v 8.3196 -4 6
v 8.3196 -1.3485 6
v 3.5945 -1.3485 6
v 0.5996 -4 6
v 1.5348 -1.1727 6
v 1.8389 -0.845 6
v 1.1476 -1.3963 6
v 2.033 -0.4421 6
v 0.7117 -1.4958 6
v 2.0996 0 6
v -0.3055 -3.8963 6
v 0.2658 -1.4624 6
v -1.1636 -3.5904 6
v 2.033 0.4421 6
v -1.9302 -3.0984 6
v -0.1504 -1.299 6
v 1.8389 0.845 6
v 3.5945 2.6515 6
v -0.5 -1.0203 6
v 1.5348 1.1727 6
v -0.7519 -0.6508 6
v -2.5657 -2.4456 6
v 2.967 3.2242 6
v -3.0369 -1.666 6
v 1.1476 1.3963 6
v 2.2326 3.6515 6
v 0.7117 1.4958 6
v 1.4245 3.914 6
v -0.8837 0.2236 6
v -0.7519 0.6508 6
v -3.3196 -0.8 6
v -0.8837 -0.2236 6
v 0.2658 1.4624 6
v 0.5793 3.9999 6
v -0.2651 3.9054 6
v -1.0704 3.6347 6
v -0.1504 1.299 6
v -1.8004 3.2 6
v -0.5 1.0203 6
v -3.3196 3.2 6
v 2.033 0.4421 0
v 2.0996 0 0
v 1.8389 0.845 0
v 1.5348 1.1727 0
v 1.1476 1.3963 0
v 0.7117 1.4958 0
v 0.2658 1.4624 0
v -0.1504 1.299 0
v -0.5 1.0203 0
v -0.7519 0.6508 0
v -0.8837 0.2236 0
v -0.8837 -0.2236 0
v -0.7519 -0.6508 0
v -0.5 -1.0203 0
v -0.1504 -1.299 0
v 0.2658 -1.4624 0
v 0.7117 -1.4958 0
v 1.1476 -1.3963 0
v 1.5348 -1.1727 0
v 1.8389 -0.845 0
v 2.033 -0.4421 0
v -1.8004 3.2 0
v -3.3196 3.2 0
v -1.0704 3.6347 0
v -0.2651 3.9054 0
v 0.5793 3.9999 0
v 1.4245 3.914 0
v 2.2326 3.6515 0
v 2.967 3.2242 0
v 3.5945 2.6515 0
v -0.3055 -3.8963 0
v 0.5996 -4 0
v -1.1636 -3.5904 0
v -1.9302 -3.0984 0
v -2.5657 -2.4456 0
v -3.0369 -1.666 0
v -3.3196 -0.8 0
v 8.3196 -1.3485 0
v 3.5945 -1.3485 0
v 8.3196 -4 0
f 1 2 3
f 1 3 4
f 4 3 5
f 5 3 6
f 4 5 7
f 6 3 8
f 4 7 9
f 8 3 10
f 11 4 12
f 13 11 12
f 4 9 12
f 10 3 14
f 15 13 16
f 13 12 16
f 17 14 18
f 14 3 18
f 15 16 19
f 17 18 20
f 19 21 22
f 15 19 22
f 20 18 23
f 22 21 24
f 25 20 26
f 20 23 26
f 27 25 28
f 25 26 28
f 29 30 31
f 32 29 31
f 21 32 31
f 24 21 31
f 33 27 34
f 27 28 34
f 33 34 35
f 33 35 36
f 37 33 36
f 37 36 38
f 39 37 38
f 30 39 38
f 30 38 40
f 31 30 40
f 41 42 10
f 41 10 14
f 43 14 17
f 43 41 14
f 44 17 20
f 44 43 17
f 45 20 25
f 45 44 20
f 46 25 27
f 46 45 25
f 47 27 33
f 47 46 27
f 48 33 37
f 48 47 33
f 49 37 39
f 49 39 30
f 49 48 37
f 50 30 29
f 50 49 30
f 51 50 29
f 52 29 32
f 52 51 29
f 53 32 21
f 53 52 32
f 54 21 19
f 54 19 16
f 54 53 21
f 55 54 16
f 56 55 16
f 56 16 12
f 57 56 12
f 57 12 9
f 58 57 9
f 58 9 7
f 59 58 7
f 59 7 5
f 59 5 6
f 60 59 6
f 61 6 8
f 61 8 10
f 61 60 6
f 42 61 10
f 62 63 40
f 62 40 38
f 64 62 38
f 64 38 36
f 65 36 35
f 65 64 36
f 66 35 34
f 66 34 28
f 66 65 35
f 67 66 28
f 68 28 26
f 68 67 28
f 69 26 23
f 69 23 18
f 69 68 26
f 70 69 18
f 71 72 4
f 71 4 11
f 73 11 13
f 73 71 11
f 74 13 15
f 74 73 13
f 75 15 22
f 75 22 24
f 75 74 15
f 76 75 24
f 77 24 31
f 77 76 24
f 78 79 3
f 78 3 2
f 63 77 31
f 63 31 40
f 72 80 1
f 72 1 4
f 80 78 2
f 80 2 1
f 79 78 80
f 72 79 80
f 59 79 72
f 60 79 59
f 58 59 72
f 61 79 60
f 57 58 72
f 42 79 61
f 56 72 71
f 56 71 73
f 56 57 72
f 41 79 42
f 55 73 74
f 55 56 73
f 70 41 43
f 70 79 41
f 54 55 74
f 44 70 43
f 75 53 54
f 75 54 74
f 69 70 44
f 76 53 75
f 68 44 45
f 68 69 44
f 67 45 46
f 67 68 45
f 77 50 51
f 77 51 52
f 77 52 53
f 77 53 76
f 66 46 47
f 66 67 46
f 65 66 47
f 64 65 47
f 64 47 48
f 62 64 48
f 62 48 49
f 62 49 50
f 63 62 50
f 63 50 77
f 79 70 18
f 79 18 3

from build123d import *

# Parameters (mm, degrees)
SKETCH1_R           = 1.5
BOSS_EXTRUDE1_DEPTH = 6


with BuildPart() as part:
    # Sketch1 → Boss-Extrude1 (new body)
    with BuildSketch(Plane.XY):
        with BuildLine():
            Line((8.319591794, -4), (0.599591794, -4))
            ThreePointArc((0.599591794, -4), (-1.930230334, -3.098386677), (-3.319591794, -0.8))
            Line((-3.319591794, -0.8), (-3.319591794, 3.2))
            Line((-3.319591794, 3.2), (-1.800408206, 3.2))
            ThreePointArc((-1.800408206, 3.2), (1.004202752, 3.979483631), (3.594535859, 2.651473185))
            Line((3.594535859, 2.651473185), (3.594535859, -1.348526815))
            Line((3.594535859, -1.348526815), (8.319591794, -1.348526815))
            Line((8.319591794, -1.348526815), (8.319591794, -4))
        make_face()
        with Locations((0.599591794, 0)):
            Circle(SKETCH1_R, mode=Mode.SUBTRACT)
    extrude(amount=BOSS_EXTRUDE1_DEPTH)


solid = part.part
